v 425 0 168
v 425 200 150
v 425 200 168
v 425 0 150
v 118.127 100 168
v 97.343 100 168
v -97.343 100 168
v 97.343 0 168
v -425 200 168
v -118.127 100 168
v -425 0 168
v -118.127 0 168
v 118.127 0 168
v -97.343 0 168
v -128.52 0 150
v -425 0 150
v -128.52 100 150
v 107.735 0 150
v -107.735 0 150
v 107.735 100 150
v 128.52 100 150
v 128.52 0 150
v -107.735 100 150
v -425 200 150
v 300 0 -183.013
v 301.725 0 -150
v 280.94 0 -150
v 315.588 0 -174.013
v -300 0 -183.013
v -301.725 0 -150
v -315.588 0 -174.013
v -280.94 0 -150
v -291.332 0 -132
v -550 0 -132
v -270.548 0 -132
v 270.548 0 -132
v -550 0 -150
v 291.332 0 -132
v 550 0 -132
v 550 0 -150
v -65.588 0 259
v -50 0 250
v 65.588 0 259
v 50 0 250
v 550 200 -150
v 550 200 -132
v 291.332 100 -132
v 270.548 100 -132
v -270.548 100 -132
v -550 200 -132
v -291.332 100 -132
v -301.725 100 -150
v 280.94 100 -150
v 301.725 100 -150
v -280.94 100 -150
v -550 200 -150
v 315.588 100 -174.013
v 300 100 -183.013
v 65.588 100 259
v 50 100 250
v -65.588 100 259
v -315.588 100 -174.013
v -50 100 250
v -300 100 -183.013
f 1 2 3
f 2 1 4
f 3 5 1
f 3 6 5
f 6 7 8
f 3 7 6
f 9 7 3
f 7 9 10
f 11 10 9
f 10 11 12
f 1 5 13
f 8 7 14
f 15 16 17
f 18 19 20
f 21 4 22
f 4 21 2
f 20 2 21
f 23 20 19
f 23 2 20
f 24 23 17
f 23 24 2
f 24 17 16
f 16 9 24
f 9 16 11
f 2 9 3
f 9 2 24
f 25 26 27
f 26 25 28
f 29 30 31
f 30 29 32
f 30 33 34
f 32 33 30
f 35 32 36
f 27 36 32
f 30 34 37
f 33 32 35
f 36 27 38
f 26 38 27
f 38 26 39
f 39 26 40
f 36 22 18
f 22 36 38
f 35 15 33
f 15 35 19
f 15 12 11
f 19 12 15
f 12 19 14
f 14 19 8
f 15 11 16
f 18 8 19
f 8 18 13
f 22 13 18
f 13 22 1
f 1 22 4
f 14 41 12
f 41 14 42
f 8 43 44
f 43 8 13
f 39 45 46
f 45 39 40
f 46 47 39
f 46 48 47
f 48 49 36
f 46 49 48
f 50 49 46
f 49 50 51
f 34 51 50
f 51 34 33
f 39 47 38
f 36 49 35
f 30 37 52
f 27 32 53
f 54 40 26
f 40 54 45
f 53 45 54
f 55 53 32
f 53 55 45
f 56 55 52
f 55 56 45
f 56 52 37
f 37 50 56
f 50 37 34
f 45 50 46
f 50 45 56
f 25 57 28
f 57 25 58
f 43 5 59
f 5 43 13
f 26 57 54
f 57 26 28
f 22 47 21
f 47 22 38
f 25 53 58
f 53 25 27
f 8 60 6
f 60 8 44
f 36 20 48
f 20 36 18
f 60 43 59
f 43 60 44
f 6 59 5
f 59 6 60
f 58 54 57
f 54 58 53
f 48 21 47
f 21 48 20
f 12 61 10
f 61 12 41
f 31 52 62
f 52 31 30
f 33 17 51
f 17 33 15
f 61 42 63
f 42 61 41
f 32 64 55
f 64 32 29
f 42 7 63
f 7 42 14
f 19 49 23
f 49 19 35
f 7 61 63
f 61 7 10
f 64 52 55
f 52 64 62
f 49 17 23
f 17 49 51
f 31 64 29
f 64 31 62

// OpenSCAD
    



hylle_d = 200;
hylle_w = 1100;
hylle_t = 18; //material thickness

vertical_spacing = 300;

support_l = 500;
support_d = 100;
support_angle = 30;
support_spacing = 50;

module hylle(x) {
    translate([-x/2, 0, 0]){
        cube(size = [hylle_w+x, hylle_d,hylle_t]);
    }
}

module support() {
    color("BurlyWood") {
        translate([support_spacing, 0, support_l/2-0]){
            rotate([0, 90-support_angle, 0]) {
                cube(size = [support_l, support_d, hylle_t]);
            }
        }
    }
}

translate([-hylle_w/2, 0, -vertical_spacing/2]){
    translate([0, 0, vertical_spacing]){
        hylle(-250);    
    }
    
    hylle(00);
} 


support();
mirror([1,0,0] ) { 
    support();
}
